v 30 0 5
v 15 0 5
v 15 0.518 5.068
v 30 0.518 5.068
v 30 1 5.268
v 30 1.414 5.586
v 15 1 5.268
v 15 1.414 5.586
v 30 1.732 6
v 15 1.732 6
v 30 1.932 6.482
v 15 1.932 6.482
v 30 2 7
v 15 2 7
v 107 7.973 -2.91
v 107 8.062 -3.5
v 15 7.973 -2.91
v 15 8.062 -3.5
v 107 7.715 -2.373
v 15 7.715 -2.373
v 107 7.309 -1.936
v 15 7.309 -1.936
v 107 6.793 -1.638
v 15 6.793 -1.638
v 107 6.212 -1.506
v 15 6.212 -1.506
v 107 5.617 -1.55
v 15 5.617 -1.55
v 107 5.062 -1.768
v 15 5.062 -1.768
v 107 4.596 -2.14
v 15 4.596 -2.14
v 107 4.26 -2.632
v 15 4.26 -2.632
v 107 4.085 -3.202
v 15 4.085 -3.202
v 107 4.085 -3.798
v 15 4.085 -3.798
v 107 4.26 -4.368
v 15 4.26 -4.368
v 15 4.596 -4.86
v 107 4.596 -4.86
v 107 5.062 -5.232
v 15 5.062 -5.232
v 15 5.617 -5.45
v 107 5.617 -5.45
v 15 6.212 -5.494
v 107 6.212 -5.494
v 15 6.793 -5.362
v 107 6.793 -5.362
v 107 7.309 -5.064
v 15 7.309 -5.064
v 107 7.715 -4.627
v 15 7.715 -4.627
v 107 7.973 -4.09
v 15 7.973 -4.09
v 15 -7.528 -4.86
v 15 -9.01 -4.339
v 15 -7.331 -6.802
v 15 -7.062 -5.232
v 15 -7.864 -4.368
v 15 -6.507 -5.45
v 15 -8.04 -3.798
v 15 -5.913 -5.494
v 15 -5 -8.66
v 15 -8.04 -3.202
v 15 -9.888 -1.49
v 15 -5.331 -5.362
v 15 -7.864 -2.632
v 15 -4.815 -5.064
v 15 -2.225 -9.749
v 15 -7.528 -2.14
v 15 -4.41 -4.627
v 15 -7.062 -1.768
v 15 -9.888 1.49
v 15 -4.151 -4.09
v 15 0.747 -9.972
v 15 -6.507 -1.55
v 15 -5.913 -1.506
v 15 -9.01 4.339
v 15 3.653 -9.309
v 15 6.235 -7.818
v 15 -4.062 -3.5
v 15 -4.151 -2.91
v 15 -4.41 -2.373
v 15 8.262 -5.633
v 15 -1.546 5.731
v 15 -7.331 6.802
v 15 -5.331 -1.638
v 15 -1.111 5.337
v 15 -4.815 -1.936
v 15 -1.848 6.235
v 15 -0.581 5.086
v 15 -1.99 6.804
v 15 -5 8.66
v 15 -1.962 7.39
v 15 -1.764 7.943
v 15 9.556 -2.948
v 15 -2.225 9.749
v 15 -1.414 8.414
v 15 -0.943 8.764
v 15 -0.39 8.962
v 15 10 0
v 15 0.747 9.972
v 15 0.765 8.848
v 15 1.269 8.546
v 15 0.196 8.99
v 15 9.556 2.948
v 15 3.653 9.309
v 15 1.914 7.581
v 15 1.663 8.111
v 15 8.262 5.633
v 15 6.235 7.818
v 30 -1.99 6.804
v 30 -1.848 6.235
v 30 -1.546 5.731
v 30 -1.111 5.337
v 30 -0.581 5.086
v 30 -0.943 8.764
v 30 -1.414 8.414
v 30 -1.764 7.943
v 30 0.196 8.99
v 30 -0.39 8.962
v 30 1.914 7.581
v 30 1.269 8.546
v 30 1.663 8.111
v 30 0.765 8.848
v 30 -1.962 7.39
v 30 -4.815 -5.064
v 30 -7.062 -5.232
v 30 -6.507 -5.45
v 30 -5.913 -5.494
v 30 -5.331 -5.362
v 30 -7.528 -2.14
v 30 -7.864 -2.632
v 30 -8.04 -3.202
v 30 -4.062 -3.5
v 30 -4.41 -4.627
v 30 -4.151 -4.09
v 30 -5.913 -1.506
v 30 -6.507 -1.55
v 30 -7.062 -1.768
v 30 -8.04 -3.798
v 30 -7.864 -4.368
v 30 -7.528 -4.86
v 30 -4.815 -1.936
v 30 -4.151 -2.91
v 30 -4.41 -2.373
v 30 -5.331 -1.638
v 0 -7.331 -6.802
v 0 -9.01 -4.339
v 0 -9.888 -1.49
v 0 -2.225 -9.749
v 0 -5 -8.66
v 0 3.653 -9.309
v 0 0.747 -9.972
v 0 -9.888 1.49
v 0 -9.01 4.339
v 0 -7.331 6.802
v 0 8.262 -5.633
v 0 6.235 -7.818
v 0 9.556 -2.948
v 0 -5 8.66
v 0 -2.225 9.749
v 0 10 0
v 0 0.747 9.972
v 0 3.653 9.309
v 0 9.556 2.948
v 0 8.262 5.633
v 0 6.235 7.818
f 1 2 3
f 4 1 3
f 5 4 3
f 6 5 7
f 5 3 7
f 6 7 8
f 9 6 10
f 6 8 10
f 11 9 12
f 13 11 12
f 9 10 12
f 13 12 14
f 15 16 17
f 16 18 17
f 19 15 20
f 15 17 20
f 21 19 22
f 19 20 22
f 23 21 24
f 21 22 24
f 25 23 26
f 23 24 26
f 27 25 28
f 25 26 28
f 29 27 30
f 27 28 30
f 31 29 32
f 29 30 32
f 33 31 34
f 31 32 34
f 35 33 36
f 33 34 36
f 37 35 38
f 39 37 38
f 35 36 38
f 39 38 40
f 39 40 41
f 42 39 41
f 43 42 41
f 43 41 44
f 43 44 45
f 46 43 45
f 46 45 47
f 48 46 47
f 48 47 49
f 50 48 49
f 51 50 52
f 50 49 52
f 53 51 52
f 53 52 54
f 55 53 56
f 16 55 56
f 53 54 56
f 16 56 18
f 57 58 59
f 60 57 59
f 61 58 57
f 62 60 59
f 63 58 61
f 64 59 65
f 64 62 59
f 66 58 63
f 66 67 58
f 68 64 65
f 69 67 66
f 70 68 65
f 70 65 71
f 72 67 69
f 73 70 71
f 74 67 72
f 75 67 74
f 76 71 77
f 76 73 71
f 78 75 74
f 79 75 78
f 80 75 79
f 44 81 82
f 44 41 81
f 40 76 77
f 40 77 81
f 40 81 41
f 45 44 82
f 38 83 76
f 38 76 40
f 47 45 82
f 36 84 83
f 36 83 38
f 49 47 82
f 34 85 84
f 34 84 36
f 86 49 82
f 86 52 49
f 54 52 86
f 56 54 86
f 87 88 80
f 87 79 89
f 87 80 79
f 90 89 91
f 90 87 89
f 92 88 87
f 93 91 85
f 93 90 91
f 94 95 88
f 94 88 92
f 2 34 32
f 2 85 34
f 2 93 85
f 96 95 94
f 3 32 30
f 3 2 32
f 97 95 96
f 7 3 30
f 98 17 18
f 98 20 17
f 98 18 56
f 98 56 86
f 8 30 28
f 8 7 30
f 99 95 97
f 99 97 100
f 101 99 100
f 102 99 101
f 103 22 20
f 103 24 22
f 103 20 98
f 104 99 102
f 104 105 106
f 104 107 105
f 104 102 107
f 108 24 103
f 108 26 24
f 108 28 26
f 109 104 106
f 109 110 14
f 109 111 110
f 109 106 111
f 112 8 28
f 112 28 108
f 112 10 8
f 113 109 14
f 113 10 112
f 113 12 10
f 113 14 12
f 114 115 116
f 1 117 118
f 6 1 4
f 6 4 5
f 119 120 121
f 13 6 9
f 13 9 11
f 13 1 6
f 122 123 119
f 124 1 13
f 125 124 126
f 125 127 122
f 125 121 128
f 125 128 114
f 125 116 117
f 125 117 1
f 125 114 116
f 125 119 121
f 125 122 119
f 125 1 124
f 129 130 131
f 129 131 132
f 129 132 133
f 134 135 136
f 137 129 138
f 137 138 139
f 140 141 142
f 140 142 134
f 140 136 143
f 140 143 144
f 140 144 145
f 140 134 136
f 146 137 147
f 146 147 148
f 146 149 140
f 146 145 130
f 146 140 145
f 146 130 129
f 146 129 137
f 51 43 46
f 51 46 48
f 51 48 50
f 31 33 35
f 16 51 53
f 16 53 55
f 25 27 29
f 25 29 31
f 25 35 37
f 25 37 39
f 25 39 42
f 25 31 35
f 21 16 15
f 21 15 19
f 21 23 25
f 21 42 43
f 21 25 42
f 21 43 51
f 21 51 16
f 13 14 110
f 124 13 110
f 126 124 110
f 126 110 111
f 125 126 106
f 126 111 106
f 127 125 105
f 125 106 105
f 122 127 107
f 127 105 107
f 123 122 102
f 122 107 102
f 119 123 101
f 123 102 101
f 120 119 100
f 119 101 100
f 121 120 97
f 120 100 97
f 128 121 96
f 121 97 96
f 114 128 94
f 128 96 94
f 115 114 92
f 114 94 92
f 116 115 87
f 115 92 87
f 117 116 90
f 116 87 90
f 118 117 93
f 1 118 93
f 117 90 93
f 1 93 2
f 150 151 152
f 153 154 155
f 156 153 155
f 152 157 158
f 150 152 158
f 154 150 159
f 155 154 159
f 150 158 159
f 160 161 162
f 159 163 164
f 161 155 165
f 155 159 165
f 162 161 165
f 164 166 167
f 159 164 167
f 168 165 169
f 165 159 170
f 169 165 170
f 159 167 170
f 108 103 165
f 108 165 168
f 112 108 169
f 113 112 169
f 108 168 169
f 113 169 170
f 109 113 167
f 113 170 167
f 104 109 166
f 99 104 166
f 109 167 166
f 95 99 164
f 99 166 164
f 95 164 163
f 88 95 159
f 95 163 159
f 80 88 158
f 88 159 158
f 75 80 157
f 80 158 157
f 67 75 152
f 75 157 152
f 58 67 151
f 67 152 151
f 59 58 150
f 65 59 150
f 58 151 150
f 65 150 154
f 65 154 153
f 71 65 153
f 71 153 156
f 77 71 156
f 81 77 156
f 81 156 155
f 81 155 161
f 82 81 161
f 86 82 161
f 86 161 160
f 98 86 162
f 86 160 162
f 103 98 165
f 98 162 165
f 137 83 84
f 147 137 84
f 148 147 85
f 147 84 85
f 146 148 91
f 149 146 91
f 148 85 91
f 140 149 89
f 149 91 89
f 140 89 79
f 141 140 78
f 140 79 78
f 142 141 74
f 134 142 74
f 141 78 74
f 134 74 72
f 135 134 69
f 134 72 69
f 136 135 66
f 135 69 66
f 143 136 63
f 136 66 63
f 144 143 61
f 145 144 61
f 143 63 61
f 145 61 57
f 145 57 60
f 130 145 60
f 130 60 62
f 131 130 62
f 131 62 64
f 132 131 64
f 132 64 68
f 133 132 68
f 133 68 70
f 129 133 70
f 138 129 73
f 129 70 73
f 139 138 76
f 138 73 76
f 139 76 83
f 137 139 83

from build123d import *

# Parameters (mm, degrees)
F0_R      = 10
F1_DEPTH  = 15
F2_R      = 2
F3_DEPTH  = 15
F3_FACE_R = 2
F4_DEPTH  = 77


with BuildPart() as f1:
    # F0 (on Right) → F1 (new body)
    with BuildSketch(Plane.YZ):
        Circle(F0_R)
    extrude(amount=F1_DEPTH)

    # F2 (on face) → F3 (join)
    with BuildSketch(Plane.YZ.offset(15)):
        with BuildLine():
            ThreePointArc((2, 7), (-1.414214, 8.414214), (0, 5))
            Line((0, 5), (0, 7))
            Line((0, 7), (2, 7))
        make_face()
        with BuildLine():
            Line((0, 7), (0, 5))
            ThreePointArc((0, 5), (1.414214, 5.585786), (2, 7))
            Line((2, 7), (0, 7))
        make_face()
        with Locations((6.062178, -3.5)):
            Circle(F2_R)
        with Locations((-6.062178, -3.5)):
            Circle(F2_R)
    extrude(amount=F3_DEPTH)

    # F3_face (on face) → F4 (join)
    with BuildSketch(Plane(origin=(30, 6.062178, -3.5), x_dir=(0, 1, 0), z_dir=(1, 0, 0))):
        Circle(F3_FACE_R)
    extrude(amount=F4_DEPTH)


solid = f1.part
